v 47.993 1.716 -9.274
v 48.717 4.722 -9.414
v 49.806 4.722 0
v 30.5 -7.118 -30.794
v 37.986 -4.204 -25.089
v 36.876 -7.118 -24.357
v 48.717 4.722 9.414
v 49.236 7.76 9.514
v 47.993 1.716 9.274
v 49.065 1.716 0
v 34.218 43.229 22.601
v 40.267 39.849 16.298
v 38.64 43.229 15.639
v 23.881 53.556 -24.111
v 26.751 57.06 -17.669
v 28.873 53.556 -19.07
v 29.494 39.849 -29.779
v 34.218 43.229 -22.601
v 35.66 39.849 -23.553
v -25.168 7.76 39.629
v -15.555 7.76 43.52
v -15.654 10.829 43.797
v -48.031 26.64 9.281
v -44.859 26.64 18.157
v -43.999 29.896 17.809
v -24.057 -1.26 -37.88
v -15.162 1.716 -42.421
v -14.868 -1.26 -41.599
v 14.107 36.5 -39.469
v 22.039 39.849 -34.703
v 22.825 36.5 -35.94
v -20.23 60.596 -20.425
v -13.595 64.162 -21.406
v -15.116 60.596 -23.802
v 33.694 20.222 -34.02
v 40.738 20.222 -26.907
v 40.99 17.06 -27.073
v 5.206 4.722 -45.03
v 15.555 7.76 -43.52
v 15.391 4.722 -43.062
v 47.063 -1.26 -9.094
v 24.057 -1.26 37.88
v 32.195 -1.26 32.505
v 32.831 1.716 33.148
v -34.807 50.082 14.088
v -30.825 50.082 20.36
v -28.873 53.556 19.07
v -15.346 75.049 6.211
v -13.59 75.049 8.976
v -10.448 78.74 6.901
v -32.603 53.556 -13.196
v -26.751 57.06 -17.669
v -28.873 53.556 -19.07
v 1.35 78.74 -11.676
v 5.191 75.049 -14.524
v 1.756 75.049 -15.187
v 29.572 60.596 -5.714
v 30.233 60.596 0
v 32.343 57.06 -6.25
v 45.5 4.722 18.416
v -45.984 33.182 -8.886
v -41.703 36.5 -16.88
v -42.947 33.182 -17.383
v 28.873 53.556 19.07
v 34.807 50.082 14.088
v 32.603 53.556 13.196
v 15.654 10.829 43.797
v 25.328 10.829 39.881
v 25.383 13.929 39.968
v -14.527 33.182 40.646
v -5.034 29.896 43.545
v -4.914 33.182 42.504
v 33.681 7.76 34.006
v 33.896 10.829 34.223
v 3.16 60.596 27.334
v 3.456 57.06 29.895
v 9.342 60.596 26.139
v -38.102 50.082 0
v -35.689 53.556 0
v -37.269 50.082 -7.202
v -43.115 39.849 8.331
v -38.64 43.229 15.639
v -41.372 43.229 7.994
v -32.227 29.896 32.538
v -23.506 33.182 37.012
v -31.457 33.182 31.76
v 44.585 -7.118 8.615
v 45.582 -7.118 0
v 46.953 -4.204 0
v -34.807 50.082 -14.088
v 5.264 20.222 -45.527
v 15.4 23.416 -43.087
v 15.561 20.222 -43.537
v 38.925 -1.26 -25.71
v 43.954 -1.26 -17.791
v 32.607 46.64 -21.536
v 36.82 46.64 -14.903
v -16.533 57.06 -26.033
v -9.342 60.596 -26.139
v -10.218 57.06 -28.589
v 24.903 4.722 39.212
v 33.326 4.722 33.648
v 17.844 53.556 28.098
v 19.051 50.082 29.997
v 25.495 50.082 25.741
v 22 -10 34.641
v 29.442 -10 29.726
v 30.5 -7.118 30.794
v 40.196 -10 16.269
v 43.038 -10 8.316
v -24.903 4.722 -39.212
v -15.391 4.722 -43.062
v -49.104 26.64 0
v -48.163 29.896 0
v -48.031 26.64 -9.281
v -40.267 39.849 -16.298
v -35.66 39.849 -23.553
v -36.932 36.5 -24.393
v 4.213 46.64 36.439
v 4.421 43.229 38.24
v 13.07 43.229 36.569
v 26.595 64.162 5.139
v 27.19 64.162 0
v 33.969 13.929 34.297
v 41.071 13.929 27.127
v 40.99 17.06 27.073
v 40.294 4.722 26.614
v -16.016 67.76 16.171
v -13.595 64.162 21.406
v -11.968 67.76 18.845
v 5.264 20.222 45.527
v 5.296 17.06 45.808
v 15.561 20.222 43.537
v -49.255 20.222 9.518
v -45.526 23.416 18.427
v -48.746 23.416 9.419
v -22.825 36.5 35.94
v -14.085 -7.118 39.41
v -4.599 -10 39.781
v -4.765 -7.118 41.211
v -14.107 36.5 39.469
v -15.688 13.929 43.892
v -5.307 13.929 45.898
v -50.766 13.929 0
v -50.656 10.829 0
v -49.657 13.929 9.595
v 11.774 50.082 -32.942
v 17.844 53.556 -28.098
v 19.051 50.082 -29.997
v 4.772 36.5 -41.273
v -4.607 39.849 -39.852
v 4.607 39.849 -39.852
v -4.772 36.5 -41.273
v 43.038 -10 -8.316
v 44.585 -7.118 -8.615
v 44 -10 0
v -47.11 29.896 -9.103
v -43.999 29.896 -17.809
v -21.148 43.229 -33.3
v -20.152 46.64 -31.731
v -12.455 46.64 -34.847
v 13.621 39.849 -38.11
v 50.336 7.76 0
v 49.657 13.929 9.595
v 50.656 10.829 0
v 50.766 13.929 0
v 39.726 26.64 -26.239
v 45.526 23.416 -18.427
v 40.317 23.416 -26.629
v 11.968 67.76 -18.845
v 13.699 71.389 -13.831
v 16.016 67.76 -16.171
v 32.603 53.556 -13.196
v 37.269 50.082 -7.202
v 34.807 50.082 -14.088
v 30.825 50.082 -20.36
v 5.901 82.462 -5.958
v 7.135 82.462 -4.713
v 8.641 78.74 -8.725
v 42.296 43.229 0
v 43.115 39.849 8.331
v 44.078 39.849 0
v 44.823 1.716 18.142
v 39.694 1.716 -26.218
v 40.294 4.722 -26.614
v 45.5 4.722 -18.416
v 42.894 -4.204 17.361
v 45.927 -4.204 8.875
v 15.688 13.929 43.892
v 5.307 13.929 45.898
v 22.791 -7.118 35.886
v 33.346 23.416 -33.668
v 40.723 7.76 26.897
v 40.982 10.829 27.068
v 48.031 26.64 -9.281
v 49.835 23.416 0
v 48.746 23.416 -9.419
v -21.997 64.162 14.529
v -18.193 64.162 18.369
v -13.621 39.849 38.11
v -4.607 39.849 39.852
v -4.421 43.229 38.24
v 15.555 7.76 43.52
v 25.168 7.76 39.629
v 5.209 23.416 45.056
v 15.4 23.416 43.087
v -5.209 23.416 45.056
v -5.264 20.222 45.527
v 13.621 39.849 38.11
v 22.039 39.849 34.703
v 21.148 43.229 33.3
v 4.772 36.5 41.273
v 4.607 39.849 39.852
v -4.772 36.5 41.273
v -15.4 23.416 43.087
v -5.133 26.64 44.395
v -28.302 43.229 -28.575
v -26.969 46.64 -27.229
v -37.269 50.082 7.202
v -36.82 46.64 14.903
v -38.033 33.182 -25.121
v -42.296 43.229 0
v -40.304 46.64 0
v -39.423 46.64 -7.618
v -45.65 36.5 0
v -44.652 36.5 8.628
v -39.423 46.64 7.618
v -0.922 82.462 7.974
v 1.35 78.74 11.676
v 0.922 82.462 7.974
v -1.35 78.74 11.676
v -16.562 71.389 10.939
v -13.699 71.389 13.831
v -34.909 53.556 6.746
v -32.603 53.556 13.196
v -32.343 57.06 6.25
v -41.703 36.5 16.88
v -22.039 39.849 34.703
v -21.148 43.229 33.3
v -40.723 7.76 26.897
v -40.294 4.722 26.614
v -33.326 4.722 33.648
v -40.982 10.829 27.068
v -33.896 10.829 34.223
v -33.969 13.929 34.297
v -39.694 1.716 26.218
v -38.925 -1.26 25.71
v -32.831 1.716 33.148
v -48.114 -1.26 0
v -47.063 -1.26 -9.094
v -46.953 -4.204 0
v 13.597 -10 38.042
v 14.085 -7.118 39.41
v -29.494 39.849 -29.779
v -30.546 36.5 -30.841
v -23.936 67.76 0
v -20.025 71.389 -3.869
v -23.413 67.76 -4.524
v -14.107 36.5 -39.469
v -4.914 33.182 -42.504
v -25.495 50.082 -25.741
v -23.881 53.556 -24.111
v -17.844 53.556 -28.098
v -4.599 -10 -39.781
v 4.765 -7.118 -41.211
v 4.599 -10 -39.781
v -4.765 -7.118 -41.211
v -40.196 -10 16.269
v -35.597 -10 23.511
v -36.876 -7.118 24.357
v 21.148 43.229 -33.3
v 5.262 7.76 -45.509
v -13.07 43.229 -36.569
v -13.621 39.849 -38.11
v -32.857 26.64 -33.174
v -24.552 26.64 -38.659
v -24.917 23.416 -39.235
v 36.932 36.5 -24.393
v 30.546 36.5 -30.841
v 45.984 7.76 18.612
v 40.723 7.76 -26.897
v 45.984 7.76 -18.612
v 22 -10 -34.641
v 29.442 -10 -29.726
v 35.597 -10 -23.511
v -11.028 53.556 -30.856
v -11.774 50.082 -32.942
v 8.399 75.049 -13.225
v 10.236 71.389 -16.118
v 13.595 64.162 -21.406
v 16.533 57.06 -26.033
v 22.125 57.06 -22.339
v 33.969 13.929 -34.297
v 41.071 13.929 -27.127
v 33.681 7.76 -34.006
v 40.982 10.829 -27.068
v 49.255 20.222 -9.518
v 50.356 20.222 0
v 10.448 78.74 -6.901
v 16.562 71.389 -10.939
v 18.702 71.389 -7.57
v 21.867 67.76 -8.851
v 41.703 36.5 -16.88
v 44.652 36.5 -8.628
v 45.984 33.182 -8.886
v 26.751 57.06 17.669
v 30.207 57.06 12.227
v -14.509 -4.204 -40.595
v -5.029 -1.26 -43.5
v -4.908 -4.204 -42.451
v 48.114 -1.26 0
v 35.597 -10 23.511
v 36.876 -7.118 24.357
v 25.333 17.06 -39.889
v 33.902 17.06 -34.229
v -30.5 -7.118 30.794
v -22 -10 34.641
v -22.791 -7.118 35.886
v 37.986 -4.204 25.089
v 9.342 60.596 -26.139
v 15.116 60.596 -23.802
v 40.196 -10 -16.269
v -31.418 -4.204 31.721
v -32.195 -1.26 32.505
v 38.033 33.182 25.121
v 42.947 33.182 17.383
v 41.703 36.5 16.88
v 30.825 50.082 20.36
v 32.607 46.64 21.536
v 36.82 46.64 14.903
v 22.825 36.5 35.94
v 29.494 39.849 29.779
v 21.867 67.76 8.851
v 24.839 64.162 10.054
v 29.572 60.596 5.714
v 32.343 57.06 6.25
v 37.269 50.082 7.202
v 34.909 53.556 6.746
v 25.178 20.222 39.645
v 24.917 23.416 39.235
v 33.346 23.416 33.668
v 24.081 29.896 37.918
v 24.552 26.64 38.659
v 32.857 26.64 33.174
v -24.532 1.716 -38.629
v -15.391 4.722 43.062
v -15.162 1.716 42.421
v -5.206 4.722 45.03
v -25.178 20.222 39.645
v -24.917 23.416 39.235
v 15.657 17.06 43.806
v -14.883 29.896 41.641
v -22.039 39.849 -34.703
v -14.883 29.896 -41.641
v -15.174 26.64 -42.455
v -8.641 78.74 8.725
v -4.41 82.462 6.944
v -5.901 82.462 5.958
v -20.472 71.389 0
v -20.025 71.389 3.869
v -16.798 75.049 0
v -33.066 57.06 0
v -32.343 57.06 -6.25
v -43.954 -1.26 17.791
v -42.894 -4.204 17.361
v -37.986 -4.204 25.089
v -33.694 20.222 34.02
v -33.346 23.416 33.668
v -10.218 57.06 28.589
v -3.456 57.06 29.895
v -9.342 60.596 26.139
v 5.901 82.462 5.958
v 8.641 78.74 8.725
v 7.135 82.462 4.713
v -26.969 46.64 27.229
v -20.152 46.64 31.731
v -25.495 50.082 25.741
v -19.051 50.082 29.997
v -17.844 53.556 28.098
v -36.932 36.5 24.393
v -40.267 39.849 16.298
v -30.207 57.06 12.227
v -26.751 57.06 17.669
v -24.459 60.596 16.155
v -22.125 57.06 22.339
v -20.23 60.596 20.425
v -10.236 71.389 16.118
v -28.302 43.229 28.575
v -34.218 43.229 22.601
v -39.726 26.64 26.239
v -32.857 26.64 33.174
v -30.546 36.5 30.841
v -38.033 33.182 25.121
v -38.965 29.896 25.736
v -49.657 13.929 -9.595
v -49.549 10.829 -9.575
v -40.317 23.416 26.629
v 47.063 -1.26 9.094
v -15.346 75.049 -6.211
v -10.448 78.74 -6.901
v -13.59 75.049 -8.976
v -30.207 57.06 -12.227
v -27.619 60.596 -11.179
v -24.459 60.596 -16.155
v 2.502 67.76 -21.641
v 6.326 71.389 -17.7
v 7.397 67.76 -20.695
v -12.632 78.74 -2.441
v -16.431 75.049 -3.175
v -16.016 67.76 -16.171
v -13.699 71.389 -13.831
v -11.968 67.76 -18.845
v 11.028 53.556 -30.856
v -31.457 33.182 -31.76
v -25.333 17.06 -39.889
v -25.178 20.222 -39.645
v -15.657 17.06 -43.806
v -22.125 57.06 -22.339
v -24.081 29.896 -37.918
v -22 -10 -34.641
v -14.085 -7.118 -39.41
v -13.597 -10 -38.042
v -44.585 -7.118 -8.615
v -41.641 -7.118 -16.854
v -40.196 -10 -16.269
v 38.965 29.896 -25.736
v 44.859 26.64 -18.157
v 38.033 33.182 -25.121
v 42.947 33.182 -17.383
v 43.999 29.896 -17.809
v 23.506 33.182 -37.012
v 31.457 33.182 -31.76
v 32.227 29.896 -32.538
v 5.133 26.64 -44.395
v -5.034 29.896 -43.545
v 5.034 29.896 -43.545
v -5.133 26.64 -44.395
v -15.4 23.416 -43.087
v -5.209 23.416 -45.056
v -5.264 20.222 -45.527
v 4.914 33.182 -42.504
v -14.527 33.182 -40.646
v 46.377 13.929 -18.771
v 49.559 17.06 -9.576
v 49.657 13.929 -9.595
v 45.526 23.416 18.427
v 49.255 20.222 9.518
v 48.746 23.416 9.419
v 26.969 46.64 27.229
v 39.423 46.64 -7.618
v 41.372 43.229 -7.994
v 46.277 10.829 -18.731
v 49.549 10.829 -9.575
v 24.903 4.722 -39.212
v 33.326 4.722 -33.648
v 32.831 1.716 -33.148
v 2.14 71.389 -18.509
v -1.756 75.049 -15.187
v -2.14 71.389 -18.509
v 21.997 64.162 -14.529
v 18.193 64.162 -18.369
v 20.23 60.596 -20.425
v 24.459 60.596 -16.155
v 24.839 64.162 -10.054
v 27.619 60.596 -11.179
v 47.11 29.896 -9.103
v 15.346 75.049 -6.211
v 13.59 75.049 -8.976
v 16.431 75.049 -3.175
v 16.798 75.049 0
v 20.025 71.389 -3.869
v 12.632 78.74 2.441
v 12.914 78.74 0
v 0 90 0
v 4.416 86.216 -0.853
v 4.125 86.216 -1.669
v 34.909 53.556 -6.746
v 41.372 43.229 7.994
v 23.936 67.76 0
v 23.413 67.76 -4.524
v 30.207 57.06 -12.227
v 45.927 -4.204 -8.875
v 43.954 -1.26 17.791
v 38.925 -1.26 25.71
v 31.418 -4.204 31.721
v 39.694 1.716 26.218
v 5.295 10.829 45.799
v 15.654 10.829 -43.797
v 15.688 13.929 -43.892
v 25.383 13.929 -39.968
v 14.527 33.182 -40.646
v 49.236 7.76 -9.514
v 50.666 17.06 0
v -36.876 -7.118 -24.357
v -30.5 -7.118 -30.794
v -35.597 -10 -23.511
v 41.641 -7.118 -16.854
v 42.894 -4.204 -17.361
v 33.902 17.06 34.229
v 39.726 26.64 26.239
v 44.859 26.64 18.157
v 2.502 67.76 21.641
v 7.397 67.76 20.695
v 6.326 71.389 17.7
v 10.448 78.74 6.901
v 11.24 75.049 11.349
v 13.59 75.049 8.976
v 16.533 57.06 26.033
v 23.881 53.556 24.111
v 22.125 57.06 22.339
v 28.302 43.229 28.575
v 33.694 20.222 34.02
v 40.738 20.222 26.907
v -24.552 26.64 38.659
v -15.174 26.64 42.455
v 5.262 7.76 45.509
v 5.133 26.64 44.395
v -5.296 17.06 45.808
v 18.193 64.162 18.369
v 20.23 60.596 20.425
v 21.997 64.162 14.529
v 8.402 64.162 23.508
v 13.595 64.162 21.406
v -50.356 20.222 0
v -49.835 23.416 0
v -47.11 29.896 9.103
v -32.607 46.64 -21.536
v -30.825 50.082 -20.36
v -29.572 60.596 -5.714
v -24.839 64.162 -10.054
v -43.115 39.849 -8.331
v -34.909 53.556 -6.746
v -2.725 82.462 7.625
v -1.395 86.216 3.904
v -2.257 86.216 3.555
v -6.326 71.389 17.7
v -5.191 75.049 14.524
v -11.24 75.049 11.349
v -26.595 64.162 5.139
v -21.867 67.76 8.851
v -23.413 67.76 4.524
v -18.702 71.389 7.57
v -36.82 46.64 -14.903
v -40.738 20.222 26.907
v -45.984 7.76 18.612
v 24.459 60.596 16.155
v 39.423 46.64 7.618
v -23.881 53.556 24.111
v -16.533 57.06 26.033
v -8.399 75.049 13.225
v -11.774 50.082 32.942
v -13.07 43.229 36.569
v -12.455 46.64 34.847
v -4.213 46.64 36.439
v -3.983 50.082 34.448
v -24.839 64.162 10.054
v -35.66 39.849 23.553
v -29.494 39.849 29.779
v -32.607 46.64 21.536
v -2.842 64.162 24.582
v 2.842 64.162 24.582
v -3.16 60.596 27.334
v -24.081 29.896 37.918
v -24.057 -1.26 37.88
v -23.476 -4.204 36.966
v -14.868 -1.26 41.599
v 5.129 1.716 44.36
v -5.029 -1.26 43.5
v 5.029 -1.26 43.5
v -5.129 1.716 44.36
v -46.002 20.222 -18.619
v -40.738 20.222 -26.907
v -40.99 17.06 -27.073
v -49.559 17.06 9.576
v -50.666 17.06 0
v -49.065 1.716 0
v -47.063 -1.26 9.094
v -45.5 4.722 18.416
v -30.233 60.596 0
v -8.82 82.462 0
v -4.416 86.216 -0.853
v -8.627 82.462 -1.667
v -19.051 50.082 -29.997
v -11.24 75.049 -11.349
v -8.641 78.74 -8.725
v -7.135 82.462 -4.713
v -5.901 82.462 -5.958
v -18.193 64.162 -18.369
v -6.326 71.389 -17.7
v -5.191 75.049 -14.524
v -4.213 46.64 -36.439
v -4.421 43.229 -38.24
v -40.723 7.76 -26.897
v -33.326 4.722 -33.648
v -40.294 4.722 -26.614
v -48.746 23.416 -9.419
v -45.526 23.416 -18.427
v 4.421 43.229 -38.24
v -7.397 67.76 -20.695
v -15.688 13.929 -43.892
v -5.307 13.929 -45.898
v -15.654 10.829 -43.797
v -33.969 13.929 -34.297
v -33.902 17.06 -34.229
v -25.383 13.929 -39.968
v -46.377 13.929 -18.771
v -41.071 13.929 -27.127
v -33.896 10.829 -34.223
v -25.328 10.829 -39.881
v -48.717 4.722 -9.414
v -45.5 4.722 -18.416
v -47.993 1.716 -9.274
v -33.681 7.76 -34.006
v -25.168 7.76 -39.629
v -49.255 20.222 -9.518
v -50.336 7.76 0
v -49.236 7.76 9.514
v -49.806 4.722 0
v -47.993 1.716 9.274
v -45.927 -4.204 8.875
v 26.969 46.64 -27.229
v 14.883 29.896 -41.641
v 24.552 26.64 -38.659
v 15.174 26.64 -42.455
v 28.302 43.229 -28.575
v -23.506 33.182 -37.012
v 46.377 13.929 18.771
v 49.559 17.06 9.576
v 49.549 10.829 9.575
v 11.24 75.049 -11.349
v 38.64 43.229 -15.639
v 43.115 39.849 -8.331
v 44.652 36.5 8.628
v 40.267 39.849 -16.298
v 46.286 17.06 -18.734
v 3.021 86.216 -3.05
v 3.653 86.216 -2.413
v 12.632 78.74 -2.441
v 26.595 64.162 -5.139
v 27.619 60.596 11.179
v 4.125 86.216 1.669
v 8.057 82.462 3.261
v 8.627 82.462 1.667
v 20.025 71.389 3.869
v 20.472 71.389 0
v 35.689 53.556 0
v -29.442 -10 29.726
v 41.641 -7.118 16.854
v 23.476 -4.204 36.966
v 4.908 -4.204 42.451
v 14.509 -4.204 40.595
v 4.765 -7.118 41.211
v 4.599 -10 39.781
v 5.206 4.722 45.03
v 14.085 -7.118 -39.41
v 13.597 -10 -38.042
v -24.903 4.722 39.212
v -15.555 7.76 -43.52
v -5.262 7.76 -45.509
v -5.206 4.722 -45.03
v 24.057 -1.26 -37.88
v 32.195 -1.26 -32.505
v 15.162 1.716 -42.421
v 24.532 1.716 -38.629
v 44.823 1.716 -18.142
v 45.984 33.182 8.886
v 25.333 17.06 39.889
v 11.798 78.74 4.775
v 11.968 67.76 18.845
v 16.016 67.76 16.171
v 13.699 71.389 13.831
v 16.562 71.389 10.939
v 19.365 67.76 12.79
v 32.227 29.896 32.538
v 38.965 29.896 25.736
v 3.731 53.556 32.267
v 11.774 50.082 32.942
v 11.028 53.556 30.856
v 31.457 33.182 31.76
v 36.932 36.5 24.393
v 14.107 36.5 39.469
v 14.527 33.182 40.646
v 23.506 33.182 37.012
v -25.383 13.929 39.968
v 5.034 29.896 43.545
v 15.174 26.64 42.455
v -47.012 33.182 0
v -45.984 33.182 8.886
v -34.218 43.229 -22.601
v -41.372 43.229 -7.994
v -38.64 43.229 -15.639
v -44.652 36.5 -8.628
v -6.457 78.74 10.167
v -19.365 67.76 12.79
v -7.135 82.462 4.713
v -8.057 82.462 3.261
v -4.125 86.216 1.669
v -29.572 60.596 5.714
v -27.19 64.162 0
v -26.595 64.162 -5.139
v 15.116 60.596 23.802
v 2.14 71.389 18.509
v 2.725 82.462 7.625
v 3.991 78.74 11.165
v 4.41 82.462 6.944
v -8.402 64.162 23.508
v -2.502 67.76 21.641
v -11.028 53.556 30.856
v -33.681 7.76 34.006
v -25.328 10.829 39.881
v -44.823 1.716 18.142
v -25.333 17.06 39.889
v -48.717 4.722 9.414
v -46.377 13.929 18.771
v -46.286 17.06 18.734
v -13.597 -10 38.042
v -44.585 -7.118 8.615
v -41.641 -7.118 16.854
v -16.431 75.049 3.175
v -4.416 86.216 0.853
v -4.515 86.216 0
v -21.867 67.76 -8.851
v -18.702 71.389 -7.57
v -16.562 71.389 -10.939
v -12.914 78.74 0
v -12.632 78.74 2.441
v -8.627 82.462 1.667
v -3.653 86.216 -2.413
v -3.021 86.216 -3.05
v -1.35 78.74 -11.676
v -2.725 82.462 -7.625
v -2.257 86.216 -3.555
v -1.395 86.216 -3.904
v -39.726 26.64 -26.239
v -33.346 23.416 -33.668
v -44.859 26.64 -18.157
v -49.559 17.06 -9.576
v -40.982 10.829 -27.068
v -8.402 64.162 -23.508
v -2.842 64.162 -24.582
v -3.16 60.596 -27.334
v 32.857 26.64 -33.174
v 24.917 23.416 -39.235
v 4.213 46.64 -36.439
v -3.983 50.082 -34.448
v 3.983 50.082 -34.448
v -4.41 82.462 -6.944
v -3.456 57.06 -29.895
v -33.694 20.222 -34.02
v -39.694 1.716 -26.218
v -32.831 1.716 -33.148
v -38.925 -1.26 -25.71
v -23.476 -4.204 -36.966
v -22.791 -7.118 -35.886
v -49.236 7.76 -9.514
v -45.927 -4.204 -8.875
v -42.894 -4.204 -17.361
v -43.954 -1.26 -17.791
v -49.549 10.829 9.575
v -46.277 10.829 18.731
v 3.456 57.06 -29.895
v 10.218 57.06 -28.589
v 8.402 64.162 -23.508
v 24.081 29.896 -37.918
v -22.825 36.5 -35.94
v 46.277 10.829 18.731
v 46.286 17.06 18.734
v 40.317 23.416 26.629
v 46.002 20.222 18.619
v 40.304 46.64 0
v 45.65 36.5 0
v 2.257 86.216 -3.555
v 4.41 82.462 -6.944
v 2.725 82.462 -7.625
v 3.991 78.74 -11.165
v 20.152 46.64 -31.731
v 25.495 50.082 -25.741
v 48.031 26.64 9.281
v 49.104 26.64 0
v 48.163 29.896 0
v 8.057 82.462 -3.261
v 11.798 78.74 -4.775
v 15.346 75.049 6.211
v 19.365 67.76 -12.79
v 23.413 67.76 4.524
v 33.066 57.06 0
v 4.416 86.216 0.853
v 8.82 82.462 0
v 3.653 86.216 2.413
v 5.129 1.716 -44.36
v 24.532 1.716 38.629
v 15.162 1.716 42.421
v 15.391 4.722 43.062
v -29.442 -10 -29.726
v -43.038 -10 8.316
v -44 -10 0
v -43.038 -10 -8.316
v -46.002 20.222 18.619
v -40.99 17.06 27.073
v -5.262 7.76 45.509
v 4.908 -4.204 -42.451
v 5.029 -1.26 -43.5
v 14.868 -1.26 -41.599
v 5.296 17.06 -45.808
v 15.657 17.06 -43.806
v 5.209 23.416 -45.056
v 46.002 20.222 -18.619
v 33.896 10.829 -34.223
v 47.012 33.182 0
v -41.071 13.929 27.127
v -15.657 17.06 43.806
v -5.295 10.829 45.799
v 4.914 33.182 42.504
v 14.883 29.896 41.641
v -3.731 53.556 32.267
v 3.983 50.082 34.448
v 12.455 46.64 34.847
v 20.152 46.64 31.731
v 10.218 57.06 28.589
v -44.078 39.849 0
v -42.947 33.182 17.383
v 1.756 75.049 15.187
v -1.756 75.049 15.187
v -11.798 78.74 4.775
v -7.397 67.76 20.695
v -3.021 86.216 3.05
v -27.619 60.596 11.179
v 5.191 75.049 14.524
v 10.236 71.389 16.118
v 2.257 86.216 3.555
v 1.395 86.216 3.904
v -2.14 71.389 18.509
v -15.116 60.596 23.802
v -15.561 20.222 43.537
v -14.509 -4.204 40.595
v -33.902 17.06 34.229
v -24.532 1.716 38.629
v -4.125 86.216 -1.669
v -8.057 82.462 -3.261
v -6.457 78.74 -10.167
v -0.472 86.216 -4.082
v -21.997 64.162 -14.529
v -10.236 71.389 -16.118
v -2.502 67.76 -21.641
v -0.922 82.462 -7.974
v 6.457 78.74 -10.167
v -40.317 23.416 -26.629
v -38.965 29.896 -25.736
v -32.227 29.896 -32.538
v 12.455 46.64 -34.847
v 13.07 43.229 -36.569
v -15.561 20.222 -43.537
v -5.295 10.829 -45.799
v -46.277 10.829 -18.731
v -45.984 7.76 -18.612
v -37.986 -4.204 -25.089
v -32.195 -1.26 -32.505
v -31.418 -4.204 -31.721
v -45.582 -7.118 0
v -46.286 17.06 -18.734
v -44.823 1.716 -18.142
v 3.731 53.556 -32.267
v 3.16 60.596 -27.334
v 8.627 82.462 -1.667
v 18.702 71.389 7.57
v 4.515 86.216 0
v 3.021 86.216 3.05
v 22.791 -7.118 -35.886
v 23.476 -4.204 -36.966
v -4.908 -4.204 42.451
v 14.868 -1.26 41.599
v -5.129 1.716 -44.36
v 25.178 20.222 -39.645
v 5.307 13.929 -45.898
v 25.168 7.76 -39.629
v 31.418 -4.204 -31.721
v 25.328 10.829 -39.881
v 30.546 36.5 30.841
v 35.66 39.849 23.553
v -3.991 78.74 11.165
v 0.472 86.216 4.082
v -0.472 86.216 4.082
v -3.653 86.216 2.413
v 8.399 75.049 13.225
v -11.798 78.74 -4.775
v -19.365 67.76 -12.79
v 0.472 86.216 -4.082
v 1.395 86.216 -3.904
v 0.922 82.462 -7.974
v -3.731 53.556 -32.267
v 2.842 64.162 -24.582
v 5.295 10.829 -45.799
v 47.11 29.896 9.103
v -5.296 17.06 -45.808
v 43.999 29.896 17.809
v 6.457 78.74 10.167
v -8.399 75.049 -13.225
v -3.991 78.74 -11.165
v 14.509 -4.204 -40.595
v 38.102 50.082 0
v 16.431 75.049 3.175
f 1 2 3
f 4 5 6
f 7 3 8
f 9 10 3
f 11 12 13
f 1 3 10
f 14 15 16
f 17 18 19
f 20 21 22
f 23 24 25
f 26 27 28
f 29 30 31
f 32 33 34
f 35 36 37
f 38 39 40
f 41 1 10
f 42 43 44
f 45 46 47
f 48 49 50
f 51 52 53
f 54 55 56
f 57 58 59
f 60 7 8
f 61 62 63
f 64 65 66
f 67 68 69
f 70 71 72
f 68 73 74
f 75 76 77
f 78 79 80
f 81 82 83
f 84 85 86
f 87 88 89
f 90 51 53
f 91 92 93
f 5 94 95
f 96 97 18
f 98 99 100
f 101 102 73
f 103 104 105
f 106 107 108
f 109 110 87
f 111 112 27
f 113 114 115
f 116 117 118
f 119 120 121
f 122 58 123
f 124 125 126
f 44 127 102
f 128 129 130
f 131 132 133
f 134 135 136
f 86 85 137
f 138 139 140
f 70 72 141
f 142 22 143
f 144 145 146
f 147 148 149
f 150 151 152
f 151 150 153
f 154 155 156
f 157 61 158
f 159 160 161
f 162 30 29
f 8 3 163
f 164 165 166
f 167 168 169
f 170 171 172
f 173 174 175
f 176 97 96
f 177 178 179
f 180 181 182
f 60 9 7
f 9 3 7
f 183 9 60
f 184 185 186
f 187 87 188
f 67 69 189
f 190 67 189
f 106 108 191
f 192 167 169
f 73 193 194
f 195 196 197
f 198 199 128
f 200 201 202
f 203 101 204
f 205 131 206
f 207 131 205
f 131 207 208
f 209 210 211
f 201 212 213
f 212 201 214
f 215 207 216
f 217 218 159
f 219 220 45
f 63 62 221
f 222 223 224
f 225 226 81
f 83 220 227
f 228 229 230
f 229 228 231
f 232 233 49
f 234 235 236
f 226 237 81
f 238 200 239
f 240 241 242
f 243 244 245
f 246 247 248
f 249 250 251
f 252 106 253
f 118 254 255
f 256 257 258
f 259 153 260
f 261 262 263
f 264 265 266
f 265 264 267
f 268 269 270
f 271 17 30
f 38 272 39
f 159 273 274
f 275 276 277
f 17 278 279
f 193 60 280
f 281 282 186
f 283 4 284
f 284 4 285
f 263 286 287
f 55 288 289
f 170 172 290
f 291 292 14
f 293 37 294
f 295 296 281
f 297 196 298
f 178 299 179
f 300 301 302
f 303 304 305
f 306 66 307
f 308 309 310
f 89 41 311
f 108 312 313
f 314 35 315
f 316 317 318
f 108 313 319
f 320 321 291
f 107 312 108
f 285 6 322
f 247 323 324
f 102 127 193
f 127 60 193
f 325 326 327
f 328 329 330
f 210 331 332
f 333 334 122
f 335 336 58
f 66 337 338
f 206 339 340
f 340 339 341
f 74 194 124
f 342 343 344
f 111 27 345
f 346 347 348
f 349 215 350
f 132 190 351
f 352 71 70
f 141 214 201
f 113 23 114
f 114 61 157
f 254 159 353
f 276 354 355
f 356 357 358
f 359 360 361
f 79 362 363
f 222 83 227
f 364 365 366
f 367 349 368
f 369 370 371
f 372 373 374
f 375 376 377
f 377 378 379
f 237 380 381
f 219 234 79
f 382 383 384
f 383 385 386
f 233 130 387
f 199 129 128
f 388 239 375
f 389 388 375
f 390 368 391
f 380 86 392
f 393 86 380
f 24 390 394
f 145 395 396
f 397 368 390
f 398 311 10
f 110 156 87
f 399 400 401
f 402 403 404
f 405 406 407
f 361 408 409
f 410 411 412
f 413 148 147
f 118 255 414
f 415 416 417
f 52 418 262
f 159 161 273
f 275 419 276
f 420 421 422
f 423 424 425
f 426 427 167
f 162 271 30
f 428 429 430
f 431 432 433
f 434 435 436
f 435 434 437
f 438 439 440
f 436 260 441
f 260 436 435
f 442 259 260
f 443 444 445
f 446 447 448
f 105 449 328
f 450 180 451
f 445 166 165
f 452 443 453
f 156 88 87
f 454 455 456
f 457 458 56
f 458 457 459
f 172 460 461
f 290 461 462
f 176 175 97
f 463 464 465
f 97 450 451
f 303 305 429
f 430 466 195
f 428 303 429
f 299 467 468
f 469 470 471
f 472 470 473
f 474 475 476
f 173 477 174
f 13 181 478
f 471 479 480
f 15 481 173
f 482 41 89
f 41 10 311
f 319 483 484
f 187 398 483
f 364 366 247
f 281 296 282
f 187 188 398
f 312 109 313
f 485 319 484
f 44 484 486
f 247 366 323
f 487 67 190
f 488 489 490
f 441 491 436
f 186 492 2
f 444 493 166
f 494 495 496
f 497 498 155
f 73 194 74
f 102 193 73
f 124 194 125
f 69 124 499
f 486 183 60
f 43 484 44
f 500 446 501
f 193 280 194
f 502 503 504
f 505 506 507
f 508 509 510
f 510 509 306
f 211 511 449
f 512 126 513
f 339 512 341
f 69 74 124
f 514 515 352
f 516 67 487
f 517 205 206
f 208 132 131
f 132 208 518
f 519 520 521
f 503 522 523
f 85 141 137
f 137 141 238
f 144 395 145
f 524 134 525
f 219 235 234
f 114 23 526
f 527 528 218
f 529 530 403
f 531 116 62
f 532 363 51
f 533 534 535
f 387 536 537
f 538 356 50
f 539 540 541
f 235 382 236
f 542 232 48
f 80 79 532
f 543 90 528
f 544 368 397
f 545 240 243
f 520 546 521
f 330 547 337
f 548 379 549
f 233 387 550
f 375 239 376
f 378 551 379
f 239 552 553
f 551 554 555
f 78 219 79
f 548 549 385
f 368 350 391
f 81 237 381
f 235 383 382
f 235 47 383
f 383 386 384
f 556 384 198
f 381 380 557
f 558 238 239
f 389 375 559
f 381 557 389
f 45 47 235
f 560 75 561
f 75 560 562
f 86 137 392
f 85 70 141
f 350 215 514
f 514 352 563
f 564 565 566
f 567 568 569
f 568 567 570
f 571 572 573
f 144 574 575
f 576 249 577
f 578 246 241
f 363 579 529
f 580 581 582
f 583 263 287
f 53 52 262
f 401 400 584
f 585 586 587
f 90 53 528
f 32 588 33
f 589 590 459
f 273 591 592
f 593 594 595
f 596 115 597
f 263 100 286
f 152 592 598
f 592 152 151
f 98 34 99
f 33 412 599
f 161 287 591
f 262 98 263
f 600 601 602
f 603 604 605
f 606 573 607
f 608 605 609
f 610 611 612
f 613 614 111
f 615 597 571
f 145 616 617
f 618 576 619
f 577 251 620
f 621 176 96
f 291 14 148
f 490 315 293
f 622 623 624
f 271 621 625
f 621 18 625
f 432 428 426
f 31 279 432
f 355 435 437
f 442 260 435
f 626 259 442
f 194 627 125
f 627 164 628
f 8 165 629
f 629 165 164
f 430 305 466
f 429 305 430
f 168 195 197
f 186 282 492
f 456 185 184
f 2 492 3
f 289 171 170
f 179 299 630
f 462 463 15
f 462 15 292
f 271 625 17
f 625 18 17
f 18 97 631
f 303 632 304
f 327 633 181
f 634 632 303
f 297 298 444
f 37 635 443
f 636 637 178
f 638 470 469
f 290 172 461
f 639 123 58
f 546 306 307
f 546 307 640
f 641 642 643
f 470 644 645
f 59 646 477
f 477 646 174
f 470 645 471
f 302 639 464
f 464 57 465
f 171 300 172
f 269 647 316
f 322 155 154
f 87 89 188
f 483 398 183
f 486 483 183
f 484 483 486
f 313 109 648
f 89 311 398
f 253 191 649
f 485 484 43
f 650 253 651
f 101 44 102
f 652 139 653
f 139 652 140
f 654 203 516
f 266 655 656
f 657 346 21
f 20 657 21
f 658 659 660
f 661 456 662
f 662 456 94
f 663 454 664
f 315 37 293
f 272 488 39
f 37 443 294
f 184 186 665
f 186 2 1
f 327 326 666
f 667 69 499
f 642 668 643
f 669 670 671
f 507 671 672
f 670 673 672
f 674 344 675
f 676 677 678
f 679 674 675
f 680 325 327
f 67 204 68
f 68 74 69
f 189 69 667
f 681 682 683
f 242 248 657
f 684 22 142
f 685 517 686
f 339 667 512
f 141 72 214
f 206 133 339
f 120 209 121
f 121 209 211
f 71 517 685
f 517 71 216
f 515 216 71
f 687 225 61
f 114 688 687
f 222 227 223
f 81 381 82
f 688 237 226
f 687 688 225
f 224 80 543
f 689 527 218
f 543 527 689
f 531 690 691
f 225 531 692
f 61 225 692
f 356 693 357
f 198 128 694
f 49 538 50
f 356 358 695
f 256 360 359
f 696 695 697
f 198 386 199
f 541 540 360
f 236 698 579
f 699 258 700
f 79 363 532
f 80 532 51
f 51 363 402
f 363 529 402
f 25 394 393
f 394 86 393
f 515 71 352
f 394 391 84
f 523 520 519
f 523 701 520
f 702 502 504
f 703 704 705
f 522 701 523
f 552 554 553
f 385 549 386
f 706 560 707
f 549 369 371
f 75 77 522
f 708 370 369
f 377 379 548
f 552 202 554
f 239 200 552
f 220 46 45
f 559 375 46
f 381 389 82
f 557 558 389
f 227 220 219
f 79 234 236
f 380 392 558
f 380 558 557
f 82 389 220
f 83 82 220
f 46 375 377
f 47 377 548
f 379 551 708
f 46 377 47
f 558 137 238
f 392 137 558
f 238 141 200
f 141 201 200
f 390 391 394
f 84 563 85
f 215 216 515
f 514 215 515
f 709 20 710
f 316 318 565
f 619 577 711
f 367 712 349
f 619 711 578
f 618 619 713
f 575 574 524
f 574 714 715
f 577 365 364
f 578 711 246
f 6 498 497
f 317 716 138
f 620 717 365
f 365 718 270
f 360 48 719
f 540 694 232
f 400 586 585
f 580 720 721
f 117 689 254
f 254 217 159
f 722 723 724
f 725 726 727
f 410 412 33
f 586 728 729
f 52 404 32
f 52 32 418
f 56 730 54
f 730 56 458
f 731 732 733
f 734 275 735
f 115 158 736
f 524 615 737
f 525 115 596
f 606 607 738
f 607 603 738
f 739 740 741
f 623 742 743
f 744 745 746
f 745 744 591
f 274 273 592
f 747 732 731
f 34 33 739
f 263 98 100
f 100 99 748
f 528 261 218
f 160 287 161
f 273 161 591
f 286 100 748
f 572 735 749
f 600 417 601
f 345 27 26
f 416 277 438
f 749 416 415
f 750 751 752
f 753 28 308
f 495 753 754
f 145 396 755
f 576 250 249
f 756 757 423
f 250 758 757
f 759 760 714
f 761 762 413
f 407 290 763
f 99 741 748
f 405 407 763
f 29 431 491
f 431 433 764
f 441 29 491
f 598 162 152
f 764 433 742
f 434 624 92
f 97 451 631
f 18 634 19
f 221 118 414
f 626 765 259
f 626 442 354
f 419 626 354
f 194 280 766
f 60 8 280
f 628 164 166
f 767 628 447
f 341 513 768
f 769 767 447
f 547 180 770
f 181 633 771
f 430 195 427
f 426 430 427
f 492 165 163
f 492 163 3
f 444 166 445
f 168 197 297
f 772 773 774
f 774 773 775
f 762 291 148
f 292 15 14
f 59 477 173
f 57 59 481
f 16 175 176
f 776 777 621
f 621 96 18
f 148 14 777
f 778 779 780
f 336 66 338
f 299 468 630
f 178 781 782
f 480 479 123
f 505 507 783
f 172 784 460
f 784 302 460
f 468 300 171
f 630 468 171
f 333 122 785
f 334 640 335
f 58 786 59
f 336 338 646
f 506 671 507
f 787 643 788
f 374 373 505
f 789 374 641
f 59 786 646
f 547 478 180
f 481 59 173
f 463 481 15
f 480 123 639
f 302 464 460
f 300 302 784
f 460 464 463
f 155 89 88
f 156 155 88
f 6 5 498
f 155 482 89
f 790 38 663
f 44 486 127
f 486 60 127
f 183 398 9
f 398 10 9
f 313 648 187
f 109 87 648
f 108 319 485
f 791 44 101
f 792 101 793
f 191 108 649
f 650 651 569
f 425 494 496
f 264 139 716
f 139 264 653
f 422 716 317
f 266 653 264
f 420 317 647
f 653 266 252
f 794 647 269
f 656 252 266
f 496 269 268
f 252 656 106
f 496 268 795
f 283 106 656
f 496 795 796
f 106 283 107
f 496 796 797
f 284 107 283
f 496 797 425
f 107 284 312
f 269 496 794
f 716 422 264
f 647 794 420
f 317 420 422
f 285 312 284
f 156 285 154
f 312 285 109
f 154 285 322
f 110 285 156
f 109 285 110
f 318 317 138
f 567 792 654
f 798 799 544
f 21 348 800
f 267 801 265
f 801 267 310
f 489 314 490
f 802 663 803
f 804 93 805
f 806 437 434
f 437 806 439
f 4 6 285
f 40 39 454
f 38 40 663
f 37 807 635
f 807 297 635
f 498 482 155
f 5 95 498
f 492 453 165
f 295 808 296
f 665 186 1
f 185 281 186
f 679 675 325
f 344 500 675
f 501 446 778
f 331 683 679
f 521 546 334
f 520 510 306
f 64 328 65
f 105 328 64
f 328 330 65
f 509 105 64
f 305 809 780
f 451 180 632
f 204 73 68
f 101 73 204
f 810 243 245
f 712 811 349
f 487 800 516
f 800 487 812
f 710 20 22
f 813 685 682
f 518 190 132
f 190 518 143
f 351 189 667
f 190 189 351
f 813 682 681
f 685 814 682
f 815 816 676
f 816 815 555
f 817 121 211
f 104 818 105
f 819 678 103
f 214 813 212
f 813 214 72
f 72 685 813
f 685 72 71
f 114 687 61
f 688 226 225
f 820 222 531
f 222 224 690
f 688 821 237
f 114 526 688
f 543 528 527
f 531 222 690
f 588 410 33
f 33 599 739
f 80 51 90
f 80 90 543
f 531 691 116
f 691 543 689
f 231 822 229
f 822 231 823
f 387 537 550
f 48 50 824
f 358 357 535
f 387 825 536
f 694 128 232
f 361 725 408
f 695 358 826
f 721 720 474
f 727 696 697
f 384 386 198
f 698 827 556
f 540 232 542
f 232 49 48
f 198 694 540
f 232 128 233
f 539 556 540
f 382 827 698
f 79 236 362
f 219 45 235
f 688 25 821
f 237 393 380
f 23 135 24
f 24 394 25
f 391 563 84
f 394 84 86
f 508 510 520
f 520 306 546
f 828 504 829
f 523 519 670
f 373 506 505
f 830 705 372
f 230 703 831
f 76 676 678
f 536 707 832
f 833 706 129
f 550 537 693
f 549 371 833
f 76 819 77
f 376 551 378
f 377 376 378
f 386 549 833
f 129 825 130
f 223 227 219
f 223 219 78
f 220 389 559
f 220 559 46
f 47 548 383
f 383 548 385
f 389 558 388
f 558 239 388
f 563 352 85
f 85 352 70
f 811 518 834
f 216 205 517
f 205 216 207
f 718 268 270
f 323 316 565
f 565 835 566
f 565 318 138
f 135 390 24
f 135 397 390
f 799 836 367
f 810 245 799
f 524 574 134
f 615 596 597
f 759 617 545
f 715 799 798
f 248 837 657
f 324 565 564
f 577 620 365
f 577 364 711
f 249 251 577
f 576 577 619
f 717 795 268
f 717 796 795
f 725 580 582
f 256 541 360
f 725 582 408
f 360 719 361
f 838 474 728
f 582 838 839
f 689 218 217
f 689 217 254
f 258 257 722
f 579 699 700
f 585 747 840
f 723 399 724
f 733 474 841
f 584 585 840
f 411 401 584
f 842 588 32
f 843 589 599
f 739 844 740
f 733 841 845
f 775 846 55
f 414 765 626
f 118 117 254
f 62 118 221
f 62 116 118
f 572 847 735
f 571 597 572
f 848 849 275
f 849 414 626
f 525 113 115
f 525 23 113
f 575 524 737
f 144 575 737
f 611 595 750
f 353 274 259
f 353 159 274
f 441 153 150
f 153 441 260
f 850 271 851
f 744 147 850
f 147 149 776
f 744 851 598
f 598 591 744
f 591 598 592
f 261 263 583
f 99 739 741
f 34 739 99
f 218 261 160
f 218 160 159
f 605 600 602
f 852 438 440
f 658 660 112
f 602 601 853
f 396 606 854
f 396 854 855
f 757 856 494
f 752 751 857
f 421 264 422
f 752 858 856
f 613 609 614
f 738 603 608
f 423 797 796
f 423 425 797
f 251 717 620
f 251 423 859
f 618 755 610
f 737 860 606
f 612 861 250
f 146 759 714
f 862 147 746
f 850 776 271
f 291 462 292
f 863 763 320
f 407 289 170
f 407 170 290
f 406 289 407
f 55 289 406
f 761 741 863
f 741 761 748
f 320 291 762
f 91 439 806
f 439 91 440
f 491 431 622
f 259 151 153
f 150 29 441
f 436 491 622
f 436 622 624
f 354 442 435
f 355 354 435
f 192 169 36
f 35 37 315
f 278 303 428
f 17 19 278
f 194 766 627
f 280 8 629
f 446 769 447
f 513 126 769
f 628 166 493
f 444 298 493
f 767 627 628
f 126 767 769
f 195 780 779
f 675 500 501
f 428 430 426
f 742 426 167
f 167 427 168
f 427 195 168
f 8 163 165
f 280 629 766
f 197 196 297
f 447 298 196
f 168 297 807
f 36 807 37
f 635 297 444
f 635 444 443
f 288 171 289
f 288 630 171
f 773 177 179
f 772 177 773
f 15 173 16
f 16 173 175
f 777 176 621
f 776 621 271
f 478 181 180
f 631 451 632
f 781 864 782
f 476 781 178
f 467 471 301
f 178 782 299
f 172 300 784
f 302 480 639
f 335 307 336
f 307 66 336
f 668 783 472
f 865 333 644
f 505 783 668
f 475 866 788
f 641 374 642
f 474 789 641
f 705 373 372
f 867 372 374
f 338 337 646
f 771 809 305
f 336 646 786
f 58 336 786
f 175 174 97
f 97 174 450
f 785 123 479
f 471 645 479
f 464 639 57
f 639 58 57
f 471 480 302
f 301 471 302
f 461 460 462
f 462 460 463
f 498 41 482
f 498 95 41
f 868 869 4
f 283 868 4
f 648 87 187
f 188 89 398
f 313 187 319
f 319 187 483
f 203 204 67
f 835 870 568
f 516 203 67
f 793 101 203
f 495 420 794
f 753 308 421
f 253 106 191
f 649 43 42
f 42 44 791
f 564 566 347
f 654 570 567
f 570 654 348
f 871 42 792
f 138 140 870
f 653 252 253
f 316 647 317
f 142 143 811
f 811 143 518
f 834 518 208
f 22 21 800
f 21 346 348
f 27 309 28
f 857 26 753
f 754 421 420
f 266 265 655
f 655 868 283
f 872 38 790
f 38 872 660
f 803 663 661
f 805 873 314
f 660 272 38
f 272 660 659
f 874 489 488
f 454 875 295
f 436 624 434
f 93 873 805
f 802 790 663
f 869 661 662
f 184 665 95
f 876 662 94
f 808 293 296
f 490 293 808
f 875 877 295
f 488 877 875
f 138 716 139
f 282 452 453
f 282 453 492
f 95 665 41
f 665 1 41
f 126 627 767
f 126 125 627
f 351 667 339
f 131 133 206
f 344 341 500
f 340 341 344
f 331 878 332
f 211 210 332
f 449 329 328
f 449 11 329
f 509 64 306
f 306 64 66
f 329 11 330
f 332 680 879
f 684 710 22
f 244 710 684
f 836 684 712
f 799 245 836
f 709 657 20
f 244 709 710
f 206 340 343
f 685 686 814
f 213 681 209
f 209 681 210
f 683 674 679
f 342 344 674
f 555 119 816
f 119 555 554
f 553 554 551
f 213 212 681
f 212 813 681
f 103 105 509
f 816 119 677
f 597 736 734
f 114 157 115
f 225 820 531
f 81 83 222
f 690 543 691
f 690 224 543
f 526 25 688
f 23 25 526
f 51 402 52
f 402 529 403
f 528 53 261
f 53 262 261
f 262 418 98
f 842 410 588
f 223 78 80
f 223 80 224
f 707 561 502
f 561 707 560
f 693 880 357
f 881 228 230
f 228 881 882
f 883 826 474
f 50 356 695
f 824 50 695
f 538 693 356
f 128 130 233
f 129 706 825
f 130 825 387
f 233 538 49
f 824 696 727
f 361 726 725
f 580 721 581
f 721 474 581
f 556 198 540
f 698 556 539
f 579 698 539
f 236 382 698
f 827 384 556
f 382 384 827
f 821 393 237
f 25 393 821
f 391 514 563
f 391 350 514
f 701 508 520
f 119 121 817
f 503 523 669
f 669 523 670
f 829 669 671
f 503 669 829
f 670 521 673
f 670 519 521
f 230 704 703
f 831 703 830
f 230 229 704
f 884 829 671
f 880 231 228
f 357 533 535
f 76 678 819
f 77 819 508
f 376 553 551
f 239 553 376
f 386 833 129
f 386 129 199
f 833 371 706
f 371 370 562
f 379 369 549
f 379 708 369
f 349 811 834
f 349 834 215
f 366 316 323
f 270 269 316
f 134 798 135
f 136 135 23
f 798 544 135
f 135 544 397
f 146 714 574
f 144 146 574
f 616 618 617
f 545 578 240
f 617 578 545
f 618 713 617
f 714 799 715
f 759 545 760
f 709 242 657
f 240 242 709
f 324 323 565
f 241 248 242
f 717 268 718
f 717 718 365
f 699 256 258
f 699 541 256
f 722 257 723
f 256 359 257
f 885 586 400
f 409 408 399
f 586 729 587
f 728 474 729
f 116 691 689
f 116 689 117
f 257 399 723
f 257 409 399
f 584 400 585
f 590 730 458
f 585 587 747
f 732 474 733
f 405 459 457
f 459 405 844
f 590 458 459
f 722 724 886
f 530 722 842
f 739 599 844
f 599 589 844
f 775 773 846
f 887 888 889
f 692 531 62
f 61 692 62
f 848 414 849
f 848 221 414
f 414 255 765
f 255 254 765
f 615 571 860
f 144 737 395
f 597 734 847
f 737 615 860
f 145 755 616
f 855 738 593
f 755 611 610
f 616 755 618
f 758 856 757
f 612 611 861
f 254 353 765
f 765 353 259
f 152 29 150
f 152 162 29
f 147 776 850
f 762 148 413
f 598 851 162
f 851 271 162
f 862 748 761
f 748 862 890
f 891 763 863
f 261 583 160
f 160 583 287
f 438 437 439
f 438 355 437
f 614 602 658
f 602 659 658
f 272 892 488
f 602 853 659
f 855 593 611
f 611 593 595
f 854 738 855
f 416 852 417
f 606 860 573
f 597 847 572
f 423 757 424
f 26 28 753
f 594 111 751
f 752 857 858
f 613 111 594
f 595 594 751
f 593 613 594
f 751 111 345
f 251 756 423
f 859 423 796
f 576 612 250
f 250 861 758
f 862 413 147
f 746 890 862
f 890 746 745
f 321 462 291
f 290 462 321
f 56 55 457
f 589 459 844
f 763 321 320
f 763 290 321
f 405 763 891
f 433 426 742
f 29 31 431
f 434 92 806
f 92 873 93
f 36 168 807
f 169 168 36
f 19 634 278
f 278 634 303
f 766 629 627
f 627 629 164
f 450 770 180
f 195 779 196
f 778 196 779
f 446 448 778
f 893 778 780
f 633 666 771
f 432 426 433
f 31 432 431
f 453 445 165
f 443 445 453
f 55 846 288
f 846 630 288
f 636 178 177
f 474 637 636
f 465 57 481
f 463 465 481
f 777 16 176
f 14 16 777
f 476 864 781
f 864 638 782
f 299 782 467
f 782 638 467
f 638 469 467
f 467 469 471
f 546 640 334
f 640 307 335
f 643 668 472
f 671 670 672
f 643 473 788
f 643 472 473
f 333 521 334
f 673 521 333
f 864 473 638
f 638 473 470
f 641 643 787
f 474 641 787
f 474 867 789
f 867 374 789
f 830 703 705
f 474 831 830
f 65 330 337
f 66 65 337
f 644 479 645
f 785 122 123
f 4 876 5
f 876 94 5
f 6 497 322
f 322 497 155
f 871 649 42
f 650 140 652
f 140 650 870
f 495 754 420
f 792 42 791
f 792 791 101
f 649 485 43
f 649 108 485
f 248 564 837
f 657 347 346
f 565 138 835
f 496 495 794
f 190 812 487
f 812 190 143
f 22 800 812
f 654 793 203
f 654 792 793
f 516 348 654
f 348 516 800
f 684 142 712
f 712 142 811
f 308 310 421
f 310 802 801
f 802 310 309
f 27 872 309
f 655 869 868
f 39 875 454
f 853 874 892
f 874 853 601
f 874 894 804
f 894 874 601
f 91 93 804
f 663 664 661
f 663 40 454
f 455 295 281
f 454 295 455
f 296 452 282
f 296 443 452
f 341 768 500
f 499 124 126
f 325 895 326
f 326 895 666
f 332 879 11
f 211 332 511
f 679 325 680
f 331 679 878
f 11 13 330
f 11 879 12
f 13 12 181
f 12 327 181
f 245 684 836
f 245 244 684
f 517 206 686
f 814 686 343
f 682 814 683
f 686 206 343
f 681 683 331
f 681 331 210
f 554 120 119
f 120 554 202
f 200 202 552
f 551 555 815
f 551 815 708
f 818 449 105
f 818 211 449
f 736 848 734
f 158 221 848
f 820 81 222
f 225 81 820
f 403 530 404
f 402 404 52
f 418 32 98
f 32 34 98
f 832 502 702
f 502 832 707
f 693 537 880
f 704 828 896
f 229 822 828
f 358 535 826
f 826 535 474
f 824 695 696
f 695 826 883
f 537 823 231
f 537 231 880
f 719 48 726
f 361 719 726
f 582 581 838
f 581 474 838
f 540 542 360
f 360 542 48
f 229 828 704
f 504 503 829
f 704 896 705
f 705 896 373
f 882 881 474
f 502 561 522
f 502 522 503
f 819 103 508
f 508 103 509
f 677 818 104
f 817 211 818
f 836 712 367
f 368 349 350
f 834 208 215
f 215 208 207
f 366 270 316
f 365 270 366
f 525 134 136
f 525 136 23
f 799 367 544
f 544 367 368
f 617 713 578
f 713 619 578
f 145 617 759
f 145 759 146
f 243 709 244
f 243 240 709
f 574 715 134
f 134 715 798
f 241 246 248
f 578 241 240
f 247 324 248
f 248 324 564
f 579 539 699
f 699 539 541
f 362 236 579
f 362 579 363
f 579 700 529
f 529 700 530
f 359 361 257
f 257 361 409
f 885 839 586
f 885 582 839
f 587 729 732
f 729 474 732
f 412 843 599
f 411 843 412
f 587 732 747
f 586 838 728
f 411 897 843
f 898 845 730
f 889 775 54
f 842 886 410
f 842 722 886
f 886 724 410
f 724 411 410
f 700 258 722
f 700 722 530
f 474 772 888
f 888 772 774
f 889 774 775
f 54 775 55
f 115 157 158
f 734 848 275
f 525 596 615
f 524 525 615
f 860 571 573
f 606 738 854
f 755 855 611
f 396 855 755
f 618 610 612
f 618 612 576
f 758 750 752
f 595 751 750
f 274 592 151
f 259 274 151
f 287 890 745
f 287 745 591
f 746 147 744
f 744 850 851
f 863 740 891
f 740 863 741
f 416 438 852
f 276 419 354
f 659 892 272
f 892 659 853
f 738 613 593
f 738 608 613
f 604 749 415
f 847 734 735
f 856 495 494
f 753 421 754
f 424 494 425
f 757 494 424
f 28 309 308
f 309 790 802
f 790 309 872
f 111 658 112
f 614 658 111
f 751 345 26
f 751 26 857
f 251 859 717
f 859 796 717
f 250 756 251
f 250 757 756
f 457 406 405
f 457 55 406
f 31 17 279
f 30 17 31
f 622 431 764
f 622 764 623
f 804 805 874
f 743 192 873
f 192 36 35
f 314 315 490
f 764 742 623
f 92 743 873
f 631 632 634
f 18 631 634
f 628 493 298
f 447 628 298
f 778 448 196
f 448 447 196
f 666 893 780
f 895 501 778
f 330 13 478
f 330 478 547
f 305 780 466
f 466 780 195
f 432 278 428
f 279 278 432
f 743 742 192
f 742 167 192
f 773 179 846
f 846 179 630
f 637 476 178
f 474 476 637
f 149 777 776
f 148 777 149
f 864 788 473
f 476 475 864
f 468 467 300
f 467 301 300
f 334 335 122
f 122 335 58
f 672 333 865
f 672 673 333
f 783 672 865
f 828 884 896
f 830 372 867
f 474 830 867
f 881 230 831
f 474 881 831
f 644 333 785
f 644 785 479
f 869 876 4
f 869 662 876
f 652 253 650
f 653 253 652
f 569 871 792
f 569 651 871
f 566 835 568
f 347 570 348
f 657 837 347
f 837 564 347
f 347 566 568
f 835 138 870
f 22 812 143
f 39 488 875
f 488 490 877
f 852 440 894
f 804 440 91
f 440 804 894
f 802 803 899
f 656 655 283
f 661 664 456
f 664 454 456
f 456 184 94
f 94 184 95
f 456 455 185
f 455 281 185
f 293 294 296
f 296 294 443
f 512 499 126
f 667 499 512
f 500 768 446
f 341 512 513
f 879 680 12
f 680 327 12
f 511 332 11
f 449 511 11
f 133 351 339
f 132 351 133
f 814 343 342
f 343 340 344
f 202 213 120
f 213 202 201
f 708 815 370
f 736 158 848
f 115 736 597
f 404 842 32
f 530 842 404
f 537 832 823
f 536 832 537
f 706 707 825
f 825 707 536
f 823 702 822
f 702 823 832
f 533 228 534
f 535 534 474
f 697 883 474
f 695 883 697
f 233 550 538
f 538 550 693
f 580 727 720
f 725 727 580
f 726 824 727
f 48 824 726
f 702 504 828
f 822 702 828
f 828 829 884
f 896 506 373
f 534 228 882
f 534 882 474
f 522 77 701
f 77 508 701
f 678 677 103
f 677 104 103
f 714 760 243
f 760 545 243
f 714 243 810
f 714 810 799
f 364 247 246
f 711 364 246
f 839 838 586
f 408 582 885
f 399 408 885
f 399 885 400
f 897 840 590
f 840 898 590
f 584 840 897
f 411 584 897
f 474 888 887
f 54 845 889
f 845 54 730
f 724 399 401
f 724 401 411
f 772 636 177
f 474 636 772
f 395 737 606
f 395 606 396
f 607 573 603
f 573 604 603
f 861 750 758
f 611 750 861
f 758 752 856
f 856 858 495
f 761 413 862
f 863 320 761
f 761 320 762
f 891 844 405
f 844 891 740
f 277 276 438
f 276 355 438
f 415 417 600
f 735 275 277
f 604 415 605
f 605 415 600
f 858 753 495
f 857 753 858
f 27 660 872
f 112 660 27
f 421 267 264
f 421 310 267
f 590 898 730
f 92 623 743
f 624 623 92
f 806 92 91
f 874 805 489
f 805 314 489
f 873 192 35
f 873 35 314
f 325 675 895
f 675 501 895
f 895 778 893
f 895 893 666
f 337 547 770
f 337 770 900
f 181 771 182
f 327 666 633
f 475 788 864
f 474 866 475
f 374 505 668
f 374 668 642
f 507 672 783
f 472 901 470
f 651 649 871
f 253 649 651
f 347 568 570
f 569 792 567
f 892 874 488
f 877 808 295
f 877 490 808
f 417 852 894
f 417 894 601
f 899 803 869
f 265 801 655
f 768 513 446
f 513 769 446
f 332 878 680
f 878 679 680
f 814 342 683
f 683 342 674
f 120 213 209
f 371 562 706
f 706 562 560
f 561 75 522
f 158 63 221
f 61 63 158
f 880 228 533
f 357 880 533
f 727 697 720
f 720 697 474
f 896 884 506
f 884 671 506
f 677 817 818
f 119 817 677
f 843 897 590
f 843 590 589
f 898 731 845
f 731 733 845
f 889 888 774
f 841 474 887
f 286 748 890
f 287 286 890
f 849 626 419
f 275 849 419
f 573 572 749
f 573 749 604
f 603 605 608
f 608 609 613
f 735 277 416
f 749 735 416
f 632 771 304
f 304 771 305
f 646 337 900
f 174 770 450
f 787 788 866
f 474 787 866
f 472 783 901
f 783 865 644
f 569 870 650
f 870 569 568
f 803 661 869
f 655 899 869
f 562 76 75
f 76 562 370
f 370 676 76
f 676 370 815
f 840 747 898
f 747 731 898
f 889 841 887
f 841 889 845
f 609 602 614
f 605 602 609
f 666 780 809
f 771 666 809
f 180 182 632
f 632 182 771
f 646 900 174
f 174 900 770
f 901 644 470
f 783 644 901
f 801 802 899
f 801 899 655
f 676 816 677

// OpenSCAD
union () {
  mirror ([-1, 0, 0]) {
    difference () {
      union () {
        difference () {
          difference () {
            scale ([1.1, 1, 1]) {
              translate ([0, -10, 0]) {
                rotate (a=90.0, v=[-1, 0, 0]) {
                  rotate_extrude ($fn=30) {
                    difference () {
                      polygon (points=[[0, 0], [40, 0], [63, 43], [0, 100], [0, 100]]);
                      polygon (points=[[40, 0], [18647/450, 1297/450], [63, 43]]);
                      polygon (points=[[18647/450, 1297/450], [9604/225, 1304/225], [63, 43]]);
                      polygon (points=[[9604/225, 1304/225], [2187/50, 437/50], [63, 43]]);
                      polygon (points=[[2187/50, 437/50], [10036/225, 2636/225], [63, 43]]);
                      polygon (points=[[10036/225, 2636/225], [815/18, 265/18], [63, 43]]);
                      polygon (points=[[815/18, 265/18], [1144/25, 444/25], [63, 43]]);
                      polygon (points=[[1144/25, 444/25], [20723/450, 9373/450], [63, 43]]);
                      polygon (points=[[20723/450, 9373/450], [10384/225, 5384/225], [63, 43]]);
                      polygon (points=[[10384/225, 5384/225], [2303/50, 1353/50], [63, 43]]);
                      polygon (points=[[2303/50, 1353/50], [412/9, 272/9], [63, 43]]);
                      polygon (points=[[412/9, 272/9], [20387/450, 15037/450], [63, 43]]);
                      polygon (points=[[20387/450, 15037/450], [1116/25, 916/25], [63, 43]]);
                      polygon (points=[[1116/25, 916/25], [19703/450, 17953/450], [63, 43]]);
                      polygon (points=[[19703/450, 17953/450], [9616/225, 9716/225], [63, 43]]);
                      polygon (points=[[9616/225, 9716/225], [83/2, 93/2], [63, 43]]);
                      polygon (points=[[83/2, 93/2], [9016/225, 11216/225], [63, 43]]);
                      polygon (points=[[9016/225, 11216/225], [17303/450, 23953/450], [63, 43]]);
                      polygon (points=[[17303/450, 23953/450], [916/25, 1416/25], [63, 43]]);
                      polygon (points=[[916/25, 1416/25], [15587/450, 27037/450], [63, 43]]);
                      polygon (points=[[15587/450, 27037/450], [292/9, 572/9], [63, 43]]);
                      polygon (points=[[292/9, 572/9], [1503/50, 3353/50], [63, 43]]);
                      polygon (points=[[1503/50, 3353/50], [6184/225, 15884/225], [63, 43]]);
                      polygon (points=[[6184/225, 15884/225], [11123/450, 33373/450], [63, 43]]);
                      polygon (points=[[11123/450, 33373/450], [544/25, 1944/25], [63, 43]]);
                      polygon (points=[[544/25, 1944/25], [335/18, 1465/18], [63, 43]]);
                      polygon (points=[[335/18, 1465/18], [3436/225, 19136/225], [63, 43]]);
                      polygon (points=[[3436/225, 19136/225], [587/50, 4437/50], [63, 43]]);
                      polygon (points=[[587/50, 4437/50], [1804/225, 20804/225], [63, 43]]);
                      polygon (points=[[1804/225, 20804/225], [1847/450, 43297/450], [63, 43]]);
                      polygon (points=[[1847/450, 43297/450], [0, 100], [63, 43]]);
                    }
                  }
                }
              }
            }
          }
        }
      }
      sphere (r=0);
    }
  }
}
